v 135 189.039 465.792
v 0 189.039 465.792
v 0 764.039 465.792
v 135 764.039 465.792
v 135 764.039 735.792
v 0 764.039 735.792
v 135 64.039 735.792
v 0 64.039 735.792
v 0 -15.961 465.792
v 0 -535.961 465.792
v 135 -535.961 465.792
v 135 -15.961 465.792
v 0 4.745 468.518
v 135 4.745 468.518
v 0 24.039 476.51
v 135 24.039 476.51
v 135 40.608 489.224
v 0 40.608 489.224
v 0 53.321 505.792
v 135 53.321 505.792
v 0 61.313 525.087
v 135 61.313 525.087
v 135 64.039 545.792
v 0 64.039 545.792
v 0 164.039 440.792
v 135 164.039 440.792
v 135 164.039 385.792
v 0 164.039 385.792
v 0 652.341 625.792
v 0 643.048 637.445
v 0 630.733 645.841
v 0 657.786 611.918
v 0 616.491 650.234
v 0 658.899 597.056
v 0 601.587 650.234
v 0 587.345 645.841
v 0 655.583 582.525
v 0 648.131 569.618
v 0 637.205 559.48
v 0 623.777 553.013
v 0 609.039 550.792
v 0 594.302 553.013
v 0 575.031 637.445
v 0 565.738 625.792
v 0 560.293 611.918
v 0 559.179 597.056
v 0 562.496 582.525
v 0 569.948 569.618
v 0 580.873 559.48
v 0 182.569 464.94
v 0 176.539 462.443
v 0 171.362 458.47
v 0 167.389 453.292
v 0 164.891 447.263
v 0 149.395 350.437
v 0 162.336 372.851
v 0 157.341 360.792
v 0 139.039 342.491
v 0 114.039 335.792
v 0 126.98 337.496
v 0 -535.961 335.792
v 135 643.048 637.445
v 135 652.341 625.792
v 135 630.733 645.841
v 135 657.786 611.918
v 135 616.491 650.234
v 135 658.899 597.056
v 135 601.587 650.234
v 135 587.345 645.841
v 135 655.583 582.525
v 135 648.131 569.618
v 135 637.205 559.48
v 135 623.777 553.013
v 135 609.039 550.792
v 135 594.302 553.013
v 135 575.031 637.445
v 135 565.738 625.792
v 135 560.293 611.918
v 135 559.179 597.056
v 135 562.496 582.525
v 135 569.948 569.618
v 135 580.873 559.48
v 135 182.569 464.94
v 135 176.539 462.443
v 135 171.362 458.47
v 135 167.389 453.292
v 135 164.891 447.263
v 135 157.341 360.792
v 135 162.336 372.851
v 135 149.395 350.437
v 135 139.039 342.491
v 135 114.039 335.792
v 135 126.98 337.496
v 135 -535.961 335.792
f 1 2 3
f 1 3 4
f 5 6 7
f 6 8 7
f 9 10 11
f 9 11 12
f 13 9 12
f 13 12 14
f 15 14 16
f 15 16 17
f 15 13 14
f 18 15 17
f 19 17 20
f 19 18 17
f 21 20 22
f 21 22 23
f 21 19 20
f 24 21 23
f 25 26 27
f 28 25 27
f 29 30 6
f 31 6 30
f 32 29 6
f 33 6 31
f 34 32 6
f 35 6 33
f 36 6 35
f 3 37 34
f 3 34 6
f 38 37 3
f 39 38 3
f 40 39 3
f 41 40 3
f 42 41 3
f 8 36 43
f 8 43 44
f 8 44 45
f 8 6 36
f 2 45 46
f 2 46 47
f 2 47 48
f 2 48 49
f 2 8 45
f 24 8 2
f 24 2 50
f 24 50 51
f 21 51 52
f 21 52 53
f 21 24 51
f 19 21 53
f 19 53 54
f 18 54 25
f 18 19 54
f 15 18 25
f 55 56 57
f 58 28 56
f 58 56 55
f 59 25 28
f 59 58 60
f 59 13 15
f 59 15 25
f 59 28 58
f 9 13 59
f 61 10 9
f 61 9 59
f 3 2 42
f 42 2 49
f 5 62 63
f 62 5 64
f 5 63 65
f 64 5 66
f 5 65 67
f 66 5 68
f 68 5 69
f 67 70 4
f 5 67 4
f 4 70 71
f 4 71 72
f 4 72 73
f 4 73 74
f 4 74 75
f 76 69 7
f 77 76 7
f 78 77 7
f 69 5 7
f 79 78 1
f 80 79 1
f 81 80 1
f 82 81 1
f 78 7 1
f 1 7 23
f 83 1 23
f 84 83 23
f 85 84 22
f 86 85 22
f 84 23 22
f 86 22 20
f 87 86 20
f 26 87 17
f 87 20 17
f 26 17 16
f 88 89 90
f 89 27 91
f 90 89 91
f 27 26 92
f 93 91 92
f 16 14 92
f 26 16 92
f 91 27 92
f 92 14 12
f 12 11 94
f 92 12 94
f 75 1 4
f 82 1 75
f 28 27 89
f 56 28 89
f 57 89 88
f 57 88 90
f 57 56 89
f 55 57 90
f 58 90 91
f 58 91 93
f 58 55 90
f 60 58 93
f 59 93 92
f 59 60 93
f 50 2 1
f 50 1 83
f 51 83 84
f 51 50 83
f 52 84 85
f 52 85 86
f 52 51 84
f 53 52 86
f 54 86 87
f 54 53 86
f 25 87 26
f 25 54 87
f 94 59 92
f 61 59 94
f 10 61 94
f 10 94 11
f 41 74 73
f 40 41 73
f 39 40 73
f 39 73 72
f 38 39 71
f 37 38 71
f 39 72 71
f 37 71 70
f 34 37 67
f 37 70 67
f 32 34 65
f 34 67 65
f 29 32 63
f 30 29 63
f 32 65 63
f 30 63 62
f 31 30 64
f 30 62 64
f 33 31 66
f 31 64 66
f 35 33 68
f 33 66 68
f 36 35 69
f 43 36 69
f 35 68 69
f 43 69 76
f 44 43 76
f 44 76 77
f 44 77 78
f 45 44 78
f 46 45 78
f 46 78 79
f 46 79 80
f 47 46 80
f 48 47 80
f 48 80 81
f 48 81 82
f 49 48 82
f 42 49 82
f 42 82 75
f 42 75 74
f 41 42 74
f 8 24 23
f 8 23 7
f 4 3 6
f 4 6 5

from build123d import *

# Parameters (mm, degrees)
BOSS_EXTRUDE1_DEPTH = 135
SKETCH2_W           = 135
SKETCH2_H           = 270
BOSS_EXTRUDE2_DEPTH = 300
SKETCH3_R           = 50
CUT_EXTRUDE1_DEPTH  = 1070.285321259


with BuildPart() as part:
    # Sketch1 → Boss-Extrude1 (new body)
    with BuildSketch(Plane(origin=(0, 0, 0), x_dir=(0, 0, -1), z_dir=(1, 0, 0))):
        with BuildLine():
            Line((-465.792131575, 464.039290463), (-465.792131575, 189.039290463))
            ThreePointArc((-465.792131575, 189.039290463), (-458.469801105, 171.361620934), (-440.792131575, 164.039290463))
            Line((-440.792131575, 164.039290463), (-385.792131575, 164.039290463))
            ThreePointArc((-385.792131575, 164.039290463), (-350.436792516, 149.394629523), (-335.792131575, 114.039290463))
            Line((-335.792131575, 114.039290463), (-335.792131575, -535.960709537))
            Line((-335.792131575, -535.960709537), (-465.792131575, -535.960709537))
            Line((-465.792131575, -535.960709537), (-465.792131575, -15.960709537))
            ThreePointArc((-465.792131575, -15.960709537), (-489.22358908, 40.607832958), (-545.792131575, 64.039290463))
            Line((-545.792131575, 64.039290463), (-735.792131575, 64.039290463))
            Line((-735.792131575, 64.039290463), (-735.792131575, 464.039290463))
            Line((-735.792131575, 464.039290463), (-465.792131575, 464.039290463))
        make_face()
    extrude(amount=BOSS_EXTRUDE1_DEPTH)

    # Sketch2 → Boss-Extrude2 (add)
    with BuildSketch(Plane(origin=(0, 464.039290463, 0), x_dir=(1, 0, 0), z_dir=(0, 1, 0))):
        with Locations((67.5, -600.792131575)):
            Rectangle(SKETCH2_W, SKETCH2_H)
    extrude(amount=BOSS_EXTRUDE2_DEPTH)

    # Sketch3 → Cut-Extrude1 (cut, through all)
    with BuildSketch(Plane(origin=(135, 0, 0), x_dir=(0, 0, -1), z_dir=(1, 0, 0))):
        with Locations((-600.792131575, 609.039290463)):
            Circle(SKETCH3_R)
    extrude(amount=-CUT_EXTRUDE1_DEPTH, mode=Mode.SUBTRACT)


solid = part.part
